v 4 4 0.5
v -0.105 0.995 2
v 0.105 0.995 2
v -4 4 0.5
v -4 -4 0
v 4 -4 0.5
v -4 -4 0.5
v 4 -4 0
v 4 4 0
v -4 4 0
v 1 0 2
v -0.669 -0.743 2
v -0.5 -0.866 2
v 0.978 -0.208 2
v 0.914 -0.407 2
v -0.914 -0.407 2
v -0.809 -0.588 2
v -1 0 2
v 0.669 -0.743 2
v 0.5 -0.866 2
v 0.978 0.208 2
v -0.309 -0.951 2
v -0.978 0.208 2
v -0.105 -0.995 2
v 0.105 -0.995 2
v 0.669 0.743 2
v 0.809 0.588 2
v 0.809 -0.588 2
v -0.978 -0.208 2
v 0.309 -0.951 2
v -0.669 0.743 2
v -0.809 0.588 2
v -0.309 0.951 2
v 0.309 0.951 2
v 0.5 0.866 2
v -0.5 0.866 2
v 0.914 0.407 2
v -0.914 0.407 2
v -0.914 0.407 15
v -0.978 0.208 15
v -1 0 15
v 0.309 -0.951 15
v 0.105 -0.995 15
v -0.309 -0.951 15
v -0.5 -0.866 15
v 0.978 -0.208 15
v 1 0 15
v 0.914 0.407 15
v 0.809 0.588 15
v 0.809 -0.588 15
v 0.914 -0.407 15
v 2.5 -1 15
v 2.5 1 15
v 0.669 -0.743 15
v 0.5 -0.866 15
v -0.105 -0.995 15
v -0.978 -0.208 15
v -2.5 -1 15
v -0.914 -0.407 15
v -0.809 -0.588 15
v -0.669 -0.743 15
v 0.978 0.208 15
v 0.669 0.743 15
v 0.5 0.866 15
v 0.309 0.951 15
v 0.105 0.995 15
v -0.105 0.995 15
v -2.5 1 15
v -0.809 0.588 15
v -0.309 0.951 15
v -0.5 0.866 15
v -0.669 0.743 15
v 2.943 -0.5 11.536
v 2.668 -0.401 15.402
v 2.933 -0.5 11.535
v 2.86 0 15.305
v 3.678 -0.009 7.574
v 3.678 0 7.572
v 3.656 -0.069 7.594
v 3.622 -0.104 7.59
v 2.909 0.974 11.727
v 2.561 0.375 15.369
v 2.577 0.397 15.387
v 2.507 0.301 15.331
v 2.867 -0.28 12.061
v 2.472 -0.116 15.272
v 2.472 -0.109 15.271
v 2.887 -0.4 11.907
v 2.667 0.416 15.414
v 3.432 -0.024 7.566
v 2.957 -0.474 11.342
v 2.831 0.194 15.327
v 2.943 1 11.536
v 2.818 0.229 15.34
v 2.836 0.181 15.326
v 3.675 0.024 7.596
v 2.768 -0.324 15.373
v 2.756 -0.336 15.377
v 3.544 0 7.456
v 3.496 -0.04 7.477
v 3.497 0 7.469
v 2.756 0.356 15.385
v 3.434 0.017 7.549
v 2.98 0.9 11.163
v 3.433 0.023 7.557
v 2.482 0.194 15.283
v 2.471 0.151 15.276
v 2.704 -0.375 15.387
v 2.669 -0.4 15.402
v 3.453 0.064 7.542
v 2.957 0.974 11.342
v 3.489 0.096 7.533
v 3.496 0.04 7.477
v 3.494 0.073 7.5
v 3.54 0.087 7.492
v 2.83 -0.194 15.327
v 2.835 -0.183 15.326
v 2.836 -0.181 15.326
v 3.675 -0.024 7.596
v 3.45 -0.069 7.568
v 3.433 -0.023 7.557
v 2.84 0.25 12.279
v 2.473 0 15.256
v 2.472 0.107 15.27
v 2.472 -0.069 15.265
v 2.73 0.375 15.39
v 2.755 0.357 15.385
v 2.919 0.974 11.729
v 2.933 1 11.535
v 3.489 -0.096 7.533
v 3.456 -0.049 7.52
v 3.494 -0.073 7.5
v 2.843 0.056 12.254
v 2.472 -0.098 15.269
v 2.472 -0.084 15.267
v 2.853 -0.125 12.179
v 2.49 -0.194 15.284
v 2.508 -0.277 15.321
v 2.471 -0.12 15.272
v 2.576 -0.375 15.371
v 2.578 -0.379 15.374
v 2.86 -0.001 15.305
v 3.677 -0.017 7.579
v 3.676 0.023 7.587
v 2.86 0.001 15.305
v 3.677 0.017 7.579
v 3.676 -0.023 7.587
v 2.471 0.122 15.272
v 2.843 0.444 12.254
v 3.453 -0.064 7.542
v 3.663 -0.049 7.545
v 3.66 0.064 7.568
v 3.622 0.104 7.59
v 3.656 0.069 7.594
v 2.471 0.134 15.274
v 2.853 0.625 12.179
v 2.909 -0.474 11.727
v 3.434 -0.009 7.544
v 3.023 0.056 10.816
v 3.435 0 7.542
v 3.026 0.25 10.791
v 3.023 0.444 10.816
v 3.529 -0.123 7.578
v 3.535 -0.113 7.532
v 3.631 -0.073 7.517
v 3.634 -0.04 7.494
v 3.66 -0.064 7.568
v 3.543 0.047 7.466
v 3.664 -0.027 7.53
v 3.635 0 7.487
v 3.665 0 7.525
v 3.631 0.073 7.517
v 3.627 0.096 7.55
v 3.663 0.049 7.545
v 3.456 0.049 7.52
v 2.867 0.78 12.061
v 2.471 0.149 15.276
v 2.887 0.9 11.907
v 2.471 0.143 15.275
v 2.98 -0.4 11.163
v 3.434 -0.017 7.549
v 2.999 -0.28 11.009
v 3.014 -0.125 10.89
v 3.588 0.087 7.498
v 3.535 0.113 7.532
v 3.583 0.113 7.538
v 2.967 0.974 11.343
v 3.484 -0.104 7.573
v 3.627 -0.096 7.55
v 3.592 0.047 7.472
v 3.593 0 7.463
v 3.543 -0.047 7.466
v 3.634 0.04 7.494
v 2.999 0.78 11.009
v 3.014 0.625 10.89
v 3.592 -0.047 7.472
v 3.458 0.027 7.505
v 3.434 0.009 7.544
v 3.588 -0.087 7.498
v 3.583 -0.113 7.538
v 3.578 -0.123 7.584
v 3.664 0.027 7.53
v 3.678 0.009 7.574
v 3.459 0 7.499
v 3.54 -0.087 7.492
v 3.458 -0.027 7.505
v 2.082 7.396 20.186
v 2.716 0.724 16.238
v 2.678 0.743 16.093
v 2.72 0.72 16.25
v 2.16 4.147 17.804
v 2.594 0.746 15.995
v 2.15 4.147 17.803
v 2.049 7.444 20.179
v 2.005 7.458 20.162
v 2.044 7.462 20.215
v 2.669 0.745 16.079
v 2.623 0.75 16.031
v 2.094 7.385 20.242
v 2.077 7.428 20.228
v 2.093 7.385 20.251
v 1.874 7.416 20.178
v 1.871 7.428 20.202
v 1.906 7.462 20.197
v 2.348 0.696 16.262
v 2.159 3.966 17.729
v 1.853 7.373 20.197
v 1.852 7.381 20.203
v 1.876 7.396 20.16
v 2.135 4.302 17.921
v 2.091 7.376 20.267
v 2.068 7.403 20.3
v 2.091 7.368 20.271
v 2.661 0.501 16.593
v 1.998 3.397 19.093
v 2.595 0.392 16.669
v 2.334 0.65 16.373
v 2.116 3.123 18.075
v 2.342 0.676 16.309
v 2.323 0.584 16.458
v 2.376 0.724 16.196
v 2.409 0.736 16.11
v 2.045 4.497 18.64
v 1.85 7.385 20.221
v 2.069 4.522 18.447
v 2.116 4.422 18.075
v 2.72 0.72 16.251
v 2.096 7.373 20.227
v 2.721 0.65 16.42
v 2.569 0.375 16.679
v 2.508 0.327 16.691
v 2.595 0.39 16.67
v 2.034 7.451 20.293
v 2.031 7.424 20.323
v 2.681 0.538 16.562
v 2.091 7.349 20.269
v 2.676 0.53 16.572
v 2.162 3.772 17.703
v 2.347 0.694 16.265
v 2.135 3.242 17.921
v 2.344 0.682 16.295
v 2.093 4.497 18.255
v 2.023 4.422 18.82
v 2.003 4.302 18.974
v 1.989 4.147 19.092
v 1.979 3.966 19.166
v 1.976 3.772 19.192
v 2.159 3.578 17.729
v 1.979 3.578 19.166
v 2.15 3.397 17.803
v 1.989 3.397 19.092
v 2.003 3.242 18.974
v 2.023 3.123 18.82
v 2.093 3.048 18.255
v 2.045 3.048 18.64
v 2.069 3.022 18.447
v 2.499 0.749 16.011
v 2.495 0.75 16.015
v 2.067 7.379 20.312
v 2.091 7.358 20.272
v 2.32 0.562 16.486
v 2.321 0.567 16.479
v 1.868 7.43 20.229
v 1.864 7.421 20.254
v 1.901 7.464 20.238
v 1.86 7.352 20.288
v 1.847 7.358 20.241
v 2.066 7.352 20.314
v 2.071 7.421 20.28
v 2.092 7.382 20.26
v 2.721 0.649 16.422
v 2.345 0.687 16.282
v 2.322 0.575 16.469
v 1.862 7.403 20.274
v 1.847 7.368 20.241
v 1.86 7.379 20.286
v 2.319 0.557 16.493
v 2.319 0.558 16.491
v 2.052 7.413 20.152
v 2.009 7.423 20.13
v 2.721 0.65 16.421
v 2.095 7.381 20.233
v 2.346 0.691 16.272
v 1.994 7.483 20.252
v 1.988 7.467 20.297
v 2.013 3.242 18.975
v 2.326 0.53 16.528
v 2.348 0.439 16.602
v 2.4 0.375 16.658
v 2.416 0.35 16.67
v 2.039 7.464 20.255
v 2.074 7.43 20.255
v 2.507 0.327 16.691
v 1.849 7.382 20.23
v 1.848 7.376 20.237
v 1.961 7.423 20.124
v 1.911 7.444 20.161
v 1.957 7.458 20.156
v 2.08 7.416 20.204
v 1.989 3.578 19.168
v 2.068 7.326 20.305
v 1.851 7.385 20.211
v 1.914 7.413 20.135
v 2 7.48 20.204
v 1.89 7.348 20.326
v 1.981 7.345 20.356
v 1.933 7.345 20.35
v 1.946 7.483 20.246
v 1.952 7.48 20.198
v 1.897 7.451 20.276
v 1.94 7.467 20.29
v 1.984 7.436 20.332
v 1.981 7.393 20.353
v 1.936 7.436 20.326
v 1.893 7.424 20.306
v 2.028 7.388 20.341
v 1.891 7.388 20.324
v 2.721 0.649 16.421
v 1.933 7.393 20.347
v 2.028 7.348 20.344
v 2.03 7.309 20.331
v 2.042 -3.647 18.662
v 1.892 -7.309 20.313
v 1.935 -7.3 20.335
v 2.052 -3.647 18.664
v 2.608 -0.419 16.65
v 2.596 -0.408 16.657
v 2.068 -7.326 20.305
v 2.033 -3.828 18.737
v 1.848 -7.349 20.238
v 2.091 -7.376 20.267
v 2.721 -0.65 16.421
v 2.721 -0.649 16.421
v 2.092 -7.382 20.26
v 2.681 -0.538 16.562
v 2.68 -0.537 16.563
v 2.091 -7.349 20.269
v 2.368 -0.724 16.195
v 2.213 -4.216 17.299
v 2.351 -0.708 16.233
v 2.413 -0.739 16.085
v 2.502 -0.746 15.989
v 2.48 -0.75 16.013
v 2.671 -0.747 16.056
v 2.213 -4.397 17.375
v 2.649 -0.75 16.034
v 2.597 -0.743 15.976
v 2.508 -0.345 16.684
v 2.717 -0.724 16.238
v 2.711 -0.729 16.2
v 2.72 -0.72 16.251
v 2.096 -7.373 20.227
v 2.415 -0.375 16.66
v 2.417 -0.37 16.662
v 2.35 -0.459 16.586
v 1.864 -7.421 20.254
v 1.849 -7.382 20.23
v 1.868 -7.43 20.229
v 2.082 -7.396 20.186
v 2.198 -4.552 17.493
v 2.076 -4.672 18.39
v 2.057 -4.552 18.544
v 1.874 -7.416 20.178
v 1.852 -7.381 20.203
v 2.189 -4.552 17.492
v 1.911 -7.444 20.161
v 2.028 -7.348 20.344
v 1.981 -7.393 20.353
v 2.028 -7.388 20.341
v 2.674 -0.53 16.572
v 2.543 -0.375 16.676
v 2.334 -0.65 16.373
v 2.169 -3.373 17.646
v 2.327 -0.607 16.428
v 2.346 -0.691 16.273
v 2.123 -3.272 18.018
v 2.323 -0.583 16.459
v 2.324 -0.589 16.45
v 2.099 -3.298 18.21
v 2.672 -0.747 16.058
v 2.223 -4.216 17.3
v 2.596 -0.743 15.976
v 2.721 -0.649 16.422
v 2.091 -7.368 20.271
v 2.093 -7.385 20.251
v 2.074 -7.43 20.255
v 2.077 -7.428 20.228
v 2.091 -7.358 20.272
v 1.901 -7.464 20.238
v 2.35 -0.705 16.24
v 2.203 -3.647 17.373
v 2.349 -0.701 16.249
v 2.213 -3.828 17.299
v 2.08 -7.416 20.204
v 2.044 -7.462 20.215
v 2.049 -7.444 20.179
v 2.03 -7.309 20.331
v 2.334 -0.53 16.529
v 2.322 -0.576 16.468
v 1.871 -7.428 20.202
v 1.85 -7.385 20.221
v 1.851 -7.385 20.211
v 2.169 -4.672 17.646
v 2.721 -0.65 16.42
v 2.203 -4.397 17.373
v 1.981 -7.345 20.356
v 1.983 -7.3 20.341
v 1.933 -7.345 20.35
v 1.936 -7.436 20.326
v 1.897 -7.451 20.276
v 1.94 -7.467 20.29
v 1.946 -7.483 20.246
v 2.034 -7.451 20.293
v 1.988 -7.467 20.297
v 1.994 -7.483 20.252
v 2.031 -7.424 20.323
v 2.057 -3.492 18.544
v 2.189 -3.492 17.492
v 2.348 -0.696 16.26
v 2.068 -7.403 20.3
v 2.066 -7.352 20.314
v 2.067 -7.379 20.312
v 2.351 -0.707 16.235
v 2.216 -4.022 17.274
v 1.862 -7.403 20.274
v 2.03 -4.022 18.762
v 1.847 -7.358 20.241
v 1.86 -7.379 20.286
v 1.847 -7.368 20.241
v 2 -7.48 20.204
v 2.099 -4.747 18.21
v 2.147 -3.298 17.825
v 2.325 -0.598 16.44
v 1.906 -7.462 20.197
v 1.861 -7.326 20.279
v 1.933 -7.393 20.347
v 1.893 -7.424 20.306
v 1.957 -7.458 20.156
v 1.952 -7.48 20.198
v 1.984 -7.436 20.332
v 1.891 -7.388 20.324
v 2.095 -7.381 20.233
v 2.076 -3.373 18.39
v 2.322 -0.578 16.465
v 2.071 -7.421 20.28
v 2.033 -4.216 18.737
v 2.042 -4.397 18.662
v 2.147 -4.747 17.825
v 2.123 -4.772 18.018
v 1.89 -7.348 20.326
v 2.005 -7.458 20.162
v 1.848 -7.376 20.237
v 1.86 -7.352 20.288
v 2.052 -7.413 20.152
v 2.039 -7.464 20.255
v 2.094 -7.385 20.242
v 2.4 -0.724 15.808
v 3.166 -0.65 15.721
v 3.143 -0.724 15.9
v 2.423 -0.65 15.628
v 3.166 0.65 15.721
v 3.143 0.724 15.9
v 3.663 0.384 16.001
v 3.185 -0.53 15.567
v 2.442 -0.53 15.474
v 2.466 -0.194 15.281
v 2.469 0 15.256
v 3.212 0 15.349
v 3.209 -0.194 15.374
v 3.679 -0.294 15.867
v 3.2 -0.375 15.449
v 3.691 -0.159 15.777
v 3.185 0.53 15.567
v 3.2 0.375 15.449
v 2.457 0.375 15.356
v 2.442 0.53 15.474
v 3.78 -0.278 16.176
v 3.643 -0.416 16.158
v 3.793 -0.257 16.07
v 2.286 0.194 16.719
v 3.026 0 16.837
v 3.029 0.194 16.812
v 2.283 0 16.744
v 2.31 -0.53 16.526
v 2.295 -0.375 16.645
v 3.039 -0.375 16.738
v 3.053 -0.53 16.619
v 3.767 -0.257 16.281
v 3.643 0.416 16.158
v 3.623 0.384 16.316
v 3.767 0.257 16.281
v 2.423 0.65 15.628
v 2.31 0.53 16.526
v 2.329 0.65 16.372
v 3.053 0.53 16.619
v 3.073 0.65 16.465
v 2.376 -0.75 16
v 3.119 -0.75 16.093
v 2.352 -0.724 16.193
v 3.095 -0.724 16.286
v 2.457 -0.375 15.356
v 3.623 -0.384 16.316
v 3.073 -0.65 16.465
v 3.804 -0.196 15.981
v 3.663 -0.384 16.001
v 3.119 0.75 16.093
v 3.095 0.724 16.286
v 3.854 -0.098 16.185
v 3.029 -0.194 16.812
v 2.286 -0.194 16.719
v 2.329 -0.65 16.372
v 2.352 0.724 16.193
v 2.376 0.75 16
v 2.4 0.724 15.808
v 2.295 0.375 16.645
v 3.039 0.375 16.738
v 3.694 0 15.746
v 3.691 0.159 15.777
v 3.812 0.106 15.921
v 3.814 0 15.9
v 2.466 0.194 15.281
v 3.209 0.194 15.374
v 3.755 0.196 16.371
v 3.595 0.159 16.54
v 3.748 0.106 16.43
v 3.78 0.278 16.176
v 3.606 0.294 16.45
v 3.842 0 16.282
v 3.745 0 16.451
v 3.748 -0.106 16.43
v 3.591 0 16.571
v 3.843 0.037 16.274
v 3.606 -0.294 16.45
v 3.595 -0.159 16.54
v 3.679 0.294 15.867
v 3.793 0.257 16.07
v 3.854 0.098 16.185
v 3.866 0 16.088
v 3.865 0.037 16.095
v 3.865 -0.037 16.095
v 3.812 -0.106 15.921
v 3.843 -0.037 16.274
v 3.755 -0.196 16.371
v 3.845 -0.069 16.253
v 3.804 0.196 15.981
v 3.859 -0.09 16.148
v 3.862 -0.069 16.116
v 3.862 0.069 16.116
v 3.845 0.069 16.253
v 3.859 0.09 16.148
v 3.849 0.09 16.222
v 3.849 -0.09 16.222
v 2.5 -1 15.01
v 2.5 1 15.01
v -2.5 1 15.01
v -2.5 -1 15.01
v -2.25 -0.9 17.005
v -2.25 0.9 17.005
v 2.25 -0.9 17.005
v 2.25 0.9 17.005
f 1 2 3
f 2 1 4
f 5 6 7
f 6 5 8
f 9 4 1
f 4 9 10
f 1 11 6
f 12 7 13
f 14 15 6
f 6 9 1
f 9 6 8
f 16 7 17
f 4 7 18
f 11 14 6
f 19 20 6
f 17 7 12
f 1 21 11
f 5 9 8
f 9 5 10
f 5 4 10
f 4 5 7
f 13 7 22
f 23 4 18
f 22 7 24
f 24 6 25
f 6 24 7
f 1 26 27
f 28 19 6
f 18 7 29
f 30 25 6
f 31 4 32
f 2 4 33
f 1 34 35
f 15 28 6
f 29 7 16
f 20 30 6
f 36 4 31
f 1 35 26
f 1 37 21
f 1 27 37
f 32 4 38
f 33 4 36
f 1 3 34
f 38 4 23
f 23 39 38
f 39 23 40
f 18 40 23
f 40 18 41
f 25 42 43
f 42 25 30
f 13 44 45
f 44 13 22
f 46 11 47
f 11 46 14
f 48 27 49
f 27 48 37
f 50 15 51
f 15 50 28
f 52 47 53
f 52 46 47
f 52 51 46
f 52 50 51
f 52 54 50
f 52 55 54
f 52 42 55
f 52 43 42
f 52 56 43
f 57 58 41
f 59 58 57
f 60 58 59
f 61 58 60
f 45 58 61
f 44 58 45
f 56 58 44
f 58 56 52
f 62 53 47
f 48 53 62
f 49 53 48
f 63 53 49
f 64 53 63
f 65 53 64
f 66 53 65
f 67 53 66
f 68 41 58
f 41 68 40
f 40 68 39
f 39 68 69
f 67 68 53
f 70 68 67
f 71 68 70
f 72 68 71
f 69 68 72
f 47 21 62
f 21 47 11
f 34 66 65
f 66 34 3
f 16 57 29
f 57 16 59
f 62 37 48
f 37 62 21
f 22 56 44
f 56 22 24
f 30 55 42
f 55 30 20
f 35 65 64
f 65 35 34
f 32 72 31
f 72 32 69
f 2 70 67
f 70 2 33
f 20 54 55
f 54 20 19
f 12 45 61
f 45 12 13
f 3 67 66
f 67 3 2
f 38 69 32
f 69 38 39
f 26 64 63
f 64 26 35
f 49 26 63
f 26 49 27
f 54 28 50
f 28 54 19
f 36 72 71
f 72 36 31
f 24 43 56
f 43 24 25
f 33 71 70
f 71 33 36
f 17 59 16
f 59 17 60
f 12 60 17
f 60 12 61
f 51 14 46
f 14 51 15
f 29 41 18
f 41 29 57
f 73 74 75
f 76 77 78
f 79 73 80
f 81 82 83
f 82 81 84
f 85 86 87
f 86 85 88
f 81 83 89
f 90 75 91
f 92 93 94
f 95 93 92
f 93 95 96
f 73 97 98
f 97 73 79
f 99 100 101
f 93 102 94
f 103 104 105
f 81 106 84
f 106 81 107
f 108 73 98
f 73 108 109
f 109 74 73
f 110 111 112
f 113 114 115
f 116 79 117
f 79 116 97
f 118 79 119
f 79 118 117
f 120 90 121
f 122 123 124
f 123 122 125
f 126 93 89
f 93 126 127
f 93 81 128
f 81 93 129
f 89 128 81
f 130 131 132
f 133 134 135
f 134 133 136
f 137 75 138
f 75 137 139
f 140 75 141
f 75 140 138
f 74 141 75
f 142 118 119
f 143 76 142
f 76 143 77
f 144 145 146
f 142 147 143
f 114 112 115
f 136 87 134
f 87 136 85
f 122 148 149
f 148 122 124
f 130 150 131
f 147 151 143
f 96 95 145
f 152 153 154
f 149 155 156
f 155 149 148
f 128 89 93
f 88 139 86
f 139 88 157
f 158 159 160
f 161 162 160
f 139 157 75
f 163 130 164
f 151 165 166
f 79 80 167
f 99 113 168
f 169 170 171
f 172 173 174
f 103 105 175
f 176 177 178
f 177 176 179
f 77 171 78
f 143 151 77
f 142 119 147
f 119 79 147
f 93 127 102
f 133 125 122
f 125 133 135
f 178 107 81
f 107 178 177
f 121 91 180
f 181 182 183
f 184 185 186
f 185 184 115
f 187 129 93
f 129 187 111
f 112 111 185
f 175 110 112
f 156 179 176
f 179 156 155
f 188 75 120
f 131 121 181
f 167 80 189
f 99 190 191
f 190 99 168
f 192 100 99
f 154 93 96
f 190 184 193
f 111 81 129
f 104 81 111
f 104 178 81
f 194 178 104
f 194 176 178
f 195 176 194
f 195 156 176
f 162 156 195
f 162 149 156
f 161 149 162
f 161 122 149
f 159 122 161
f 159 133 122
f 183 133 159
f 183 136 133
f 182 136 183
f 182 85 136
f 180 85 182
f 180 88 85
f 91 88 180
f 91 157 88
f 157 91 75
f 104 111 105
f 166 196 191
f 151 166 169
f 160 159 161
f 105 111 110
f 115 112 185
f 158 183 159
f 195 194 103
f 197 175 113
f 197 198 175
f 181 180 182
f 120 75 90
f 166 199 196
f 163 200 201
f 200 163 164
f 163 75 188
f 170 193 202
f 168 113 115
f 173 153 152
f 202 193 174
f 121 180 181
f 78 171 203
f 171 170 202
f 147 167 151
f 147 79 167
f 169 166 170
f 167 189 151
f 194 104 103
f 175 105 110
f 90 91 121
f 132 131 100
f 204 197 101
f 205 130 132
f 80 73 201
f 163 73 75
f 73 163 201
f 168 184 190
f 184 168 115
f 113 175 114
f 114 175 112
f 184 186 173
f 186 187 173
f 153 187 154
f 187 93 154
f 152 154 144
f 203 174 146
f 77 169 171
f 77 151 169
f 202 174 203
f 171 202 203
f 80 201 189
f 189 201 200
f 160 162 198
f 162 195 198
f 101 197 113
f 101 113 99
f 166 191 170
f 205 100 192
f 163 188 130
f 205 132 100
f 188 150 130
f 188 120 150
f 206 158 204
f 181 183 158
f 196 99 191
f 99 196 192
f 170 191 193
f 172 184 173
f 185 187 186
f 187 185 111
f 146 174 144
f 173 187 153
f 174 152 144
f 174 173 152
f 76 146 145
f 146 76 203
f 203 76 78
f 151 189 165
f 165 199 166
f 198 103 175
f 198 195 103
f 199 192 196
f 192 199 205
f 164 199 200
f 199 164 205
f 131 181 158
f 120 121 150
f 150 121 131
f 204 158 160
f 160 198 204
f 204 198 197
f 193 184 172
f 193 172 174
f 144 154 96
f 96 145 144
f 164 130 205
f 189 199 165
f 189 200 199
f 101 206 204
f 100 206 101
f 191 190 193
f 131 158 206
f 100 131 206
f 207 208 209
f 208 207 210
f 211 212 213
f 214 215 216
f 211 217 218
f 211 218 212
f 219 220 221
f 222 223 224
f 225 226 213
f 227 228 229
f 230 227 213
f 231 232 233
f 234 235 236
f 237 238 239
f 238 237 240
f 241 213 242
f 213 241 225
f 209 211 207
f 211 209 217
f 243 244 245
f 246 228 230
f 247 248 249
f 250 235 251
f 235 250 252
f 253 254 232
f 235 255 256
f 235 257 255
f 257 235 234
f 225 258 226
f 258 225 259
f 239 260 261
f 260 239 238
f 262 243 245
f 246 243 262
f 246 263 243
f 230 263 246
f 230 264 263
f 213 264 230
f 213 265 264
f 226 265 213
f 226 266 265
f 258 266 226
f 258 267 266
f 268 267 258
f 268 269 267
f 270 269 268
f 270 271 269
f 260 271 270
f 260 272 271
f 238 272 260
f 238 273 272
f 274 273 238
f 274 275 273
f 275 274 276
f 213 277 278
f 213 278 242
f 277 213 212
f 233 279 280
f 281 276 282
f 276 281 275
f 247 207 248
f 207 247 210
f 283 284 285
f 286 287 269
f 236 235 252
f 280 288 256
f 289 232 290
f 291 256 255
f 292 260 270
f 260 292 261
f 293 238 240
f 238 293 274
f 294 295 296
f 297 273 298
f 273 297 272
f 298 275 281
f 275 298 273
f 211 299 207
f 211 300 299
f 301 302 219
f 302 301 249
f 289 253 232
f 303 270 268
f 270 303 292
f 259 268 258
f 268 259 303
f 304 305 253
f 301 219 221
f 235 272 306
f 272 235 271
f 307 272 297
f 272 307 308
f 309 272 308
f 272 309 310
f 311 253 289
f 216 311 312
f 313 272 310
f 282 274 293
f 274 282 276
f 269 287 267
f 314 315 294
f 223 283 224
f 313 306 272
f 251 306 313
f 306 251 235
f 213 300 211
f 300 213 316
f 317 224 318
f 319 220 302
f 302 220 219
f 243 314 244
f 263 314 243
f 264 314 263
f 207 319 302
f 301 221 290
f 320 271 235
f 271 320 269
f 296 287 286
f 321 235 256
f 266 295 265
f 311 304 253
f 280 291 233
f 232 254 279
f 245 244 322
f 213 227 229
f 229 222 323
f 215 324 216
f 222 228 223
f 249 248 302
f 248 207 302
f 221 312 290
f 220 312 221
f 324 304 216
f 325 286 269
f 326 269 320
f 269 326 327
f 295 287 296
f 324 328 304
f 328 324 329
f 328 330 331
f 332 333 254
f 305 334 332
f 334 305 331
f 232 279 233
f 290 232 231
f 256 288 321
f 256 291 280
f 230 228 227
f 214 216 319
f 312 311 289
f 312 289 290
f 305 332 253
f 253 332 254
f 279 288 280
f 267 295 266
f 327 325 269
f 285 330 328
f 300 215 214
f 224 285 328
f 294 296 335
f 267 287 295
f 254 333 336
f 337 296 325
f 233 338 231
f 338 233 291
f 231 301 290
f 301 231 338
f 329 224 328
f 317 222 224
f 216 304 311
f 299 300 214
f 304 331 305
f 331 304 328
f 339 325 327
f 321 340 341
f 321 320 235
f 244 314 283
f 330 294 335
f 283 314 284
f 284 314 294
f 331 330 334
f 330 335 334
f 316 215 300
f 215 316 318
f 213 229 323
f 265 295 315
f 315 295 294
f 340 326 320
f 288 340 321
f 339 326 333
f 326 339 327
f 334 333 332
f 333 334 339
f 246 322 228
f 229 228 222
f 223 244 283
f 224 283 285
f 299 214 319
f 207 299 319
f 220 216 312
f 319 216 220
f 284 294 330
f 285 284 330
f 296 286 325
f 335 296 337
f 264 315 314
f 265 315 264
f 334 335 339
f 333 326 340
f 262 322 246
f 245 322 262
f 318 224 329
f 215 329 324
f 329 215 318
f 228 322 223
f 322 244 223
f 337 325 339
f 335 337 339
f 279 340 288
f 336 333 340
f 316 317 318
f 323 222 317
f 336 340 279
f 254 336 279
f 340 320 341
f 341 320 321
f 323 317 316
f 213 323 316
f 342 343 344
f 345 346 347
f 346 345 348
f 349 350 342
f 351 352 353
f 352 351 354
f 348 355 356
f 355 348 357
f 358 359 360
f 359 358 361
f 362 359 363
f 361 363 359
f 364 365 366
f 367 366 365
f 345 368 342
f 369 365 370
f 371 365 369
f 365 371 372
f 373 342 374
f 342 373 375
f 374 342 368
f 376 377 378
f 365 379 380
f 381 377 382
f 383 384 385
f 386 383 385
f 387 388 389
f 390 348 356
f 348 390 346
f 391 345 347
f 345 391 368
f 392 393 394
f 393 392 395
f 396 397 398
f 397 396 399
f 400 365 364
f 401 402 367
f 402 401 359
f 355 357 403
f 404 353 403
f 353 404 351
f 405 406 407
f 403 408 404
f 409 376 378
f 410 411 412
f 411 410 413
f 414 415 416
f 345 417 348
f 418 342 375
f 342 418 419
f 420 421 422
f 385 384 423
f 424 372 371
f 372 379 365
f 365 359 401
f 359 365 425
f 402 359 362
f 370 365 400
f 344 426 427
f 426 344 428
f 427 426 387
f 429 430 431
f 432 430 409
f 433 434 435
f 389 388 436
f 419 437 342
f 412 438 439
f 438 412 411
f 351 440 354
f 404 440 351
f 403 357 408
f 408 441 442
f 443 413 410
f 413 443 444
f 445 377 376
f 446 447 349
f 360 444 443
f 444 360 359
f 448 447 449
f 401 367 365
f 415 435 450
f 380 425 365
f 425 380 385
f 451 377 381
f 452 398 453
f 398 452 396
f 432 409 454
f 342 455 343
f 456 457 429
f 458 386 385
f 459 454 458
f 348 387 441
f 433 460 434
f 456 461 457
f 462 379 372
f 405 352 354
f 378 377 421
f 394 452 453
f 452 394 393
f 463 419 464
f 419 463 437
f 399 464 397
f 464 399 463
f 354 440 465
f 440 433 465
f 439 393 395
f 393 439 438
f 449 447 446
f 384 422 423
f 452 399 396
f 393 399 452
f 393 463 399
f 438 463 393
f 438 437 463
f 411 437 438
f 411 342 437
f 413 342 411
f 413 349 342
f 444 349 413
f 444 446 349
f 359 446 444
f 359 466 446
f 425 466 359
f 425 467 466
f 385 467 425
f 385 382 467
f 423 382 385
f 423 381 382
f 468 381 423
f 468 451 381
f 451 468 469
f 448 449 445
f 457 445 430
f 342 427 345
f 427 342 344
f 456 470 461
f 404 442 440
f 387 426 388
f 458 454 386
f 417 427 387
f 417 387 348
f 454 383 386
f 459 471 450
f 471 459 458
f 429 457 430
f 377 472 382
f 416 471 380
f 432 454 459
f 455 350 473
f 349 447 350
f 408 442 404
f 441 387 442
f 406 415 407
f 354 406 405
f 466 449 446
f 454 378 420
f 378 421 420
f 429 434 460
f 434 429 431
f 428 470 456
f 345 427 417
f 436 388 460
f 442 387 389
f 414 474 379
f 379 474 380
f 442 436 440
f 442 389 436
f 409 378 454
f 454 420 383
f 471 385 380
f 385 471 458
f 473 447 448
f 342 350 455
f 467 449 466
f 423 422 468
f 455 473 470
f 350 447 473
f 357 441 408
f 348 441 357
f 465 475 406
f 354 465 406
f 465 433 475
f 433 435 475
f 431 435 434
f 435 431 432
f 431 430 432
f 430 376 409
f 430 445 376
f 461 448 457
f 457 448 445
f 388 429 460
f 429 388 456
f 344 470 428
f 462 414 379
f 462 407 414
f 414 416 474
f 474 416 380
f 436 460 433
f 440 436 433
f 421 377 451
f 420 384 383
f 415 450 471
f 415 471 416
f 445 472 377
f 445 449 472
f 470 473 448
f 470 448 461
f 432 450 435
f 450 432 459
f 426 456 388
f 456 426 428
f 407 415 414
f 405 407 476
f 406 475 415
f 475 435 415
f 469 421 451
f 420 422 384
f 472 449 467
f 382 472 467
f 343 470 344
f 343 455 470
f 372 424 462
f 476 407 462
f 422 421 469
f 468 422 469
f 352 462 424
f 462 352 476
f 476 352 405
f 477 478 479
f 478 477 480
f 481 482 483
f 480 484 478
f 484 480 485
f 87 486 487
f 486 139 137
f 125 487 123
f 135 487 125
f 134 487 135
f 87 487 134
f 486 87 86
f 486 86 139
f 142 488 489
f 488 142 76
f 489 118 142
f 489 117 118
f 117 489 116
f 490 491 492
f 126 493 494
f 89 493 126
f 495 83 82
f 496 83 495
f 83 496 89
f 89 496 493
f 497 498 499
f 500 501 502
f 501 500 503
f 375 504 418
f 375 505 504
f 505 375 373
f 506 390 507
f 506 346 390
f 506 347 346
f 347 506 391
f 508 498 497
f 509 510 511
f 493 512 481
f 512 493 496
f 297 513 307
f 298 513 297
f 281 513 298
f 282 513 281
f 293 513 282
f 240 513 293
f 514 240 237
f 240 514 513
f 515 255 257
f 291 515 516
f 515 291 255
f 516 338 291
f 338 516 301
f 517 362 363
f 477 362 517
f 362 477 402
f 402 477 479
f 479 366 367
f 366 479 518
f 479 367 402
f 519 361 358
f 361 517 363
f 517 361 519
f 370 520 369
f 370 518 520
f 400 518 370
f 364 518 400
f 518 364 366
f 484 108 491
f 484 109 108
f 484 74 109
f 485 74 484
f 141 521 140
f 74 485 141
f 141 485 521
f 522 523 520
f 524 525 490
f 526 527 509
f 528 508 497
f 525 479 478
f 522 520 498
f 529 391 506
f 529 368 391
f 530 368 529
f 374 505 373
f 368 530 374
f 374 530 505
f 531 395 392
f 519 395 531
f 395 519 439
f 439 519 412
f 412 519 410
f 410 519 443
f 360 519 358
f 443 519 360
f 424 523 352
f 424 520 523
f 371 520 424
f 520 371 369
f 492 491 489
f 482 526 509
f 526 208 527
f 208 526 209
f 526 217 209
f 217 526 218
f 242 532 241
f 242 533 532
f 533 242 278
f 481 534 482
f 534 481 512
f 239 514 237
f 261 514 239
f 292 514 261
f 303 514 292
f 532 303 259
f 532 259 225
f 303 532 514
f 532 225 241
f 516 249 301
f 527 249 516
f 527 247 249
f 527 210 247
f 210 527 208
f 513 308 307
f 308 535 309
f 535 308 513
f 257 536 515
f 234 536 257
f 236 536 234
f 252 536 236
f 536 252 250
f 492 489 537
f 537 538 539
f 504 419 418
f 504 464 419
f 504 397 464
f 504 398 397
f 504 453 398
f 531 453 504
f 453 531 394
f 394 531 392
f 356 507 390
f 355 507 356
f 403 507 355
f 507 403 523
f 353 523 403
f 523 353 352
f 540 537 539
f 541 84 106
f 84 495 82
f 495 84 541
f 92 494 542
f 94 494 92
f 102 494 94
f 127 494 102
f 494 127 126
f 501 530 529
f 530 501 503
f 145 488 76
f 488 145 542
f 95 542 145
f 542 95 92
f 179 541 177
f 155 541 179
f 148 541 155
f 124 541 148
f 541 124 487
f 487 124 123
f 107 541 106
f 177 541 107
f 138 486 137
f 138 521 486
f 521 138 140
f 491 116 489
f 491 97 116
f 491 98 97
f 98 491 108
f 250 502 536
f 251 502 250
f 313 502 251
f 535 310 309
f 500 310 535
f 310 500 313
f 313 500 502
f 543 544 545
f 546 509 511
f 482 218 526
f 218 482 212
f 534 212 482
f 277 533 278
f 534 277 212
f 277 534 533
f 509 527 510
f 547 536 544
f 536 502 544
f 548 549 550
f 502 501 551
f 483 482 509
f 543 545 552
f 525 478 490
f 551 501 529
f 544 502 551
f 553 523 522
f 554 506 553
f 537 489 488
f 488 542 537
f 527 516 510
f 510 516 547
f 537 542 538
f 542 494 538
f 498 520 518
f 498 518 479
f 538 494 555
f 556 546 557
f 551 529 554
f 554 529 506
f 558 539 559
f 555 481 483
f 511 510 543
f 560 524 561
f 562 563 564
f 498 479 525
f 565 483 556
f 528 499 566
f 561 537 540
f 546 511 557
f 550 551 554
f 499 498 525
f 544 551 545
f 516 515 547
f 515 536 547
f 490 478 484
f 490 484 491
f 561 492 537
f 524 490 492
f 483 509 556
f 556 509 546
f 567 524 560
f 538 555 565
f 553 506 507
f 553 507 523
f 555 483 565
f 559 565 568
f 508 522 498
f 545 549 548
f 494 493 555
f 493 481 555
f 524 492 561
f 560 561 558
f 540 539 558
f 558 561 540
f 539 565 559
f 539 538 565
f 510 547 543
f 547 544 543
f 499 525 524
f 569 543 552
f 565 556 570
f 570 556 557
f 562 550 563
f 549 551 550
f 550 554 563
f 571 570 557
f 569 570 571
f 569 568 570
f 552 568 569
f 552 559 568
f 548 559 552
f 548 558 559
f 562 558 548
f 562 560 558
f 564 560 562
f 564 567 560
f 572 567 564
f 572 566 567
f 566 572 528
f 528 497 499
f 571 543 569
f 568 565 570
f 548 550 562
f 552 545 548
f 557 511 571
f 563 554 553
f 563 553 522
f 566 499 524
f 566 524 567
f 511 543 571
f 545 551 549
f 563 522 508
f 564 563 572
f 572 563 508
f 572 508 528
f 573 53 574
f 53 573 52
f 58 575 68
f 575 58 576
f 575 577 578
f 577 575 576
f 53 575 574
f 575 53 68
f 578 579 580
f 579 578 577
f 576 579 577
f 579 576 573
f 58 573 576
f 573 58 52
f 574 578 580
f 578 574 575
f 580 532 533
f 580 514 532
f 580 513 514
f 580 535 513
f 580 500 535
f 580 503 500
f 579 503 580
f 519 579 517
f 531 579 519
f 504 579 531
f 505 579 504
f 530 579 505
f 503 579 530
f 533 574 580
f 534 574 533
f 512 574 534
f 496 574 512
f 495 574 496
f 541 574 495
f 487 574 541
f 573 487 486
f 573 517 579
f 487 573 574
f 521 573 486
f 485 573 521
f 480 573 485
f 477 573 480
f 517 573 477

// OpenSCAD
// file: wings.scad
eps=0.01;
$fs=0.2;

module wing() {
	hull() {
      // closest to base
		scale([1,1,.5]) rotate([0,-90,0]) translate([.4,0])
	      cylinder(r=0.4,h=eps);
      // middle of wing
		translate([4,.25]) cylinder(r=.75,h=eps);
      //  tip of wing
		translate([8,0,1/8]) sphere(1/8, $fn=16);
	}
}

module wings() {
	for (i = [0:2]) {
	  rotate([0,0,i * 360/3]) translate([.5,0]) wing();
	}
	
	hull() {
	  cylinder(r=.75, h=.75);
	  translate([0,0,1]) sphere(r=.5);
	}
}

wings();
// file: generator.scad
eps=0.01;

module generator() {
	hull() {
		translate([0,0,eps/2]) cube([5,2,eps], center=true);
		translate([0,0,2]) cube([.9*5,.9*2,eps], center=true);
	}
}

generator();
// file: base.scad
$fs=.2;

module base() {
	hull() {
	  translate([-4,-4,0]) cube([8,8,.5]);
	  cylinder(h=2, r=1);
	}
	cylinder(h=15, r=1);
}

base();
// main file
use <base.scad>;
use <generator.scad>;
use <wings.scad>;

wing_angle = atan2(.10*5/2, 2);
echo(wing_angle);

base();
translate([5/2 - .1*5/2/2,0,15 + 2/2]) rotate([0,90-wing_angle,0]) wings();
translate([0,0,15]) generator();
